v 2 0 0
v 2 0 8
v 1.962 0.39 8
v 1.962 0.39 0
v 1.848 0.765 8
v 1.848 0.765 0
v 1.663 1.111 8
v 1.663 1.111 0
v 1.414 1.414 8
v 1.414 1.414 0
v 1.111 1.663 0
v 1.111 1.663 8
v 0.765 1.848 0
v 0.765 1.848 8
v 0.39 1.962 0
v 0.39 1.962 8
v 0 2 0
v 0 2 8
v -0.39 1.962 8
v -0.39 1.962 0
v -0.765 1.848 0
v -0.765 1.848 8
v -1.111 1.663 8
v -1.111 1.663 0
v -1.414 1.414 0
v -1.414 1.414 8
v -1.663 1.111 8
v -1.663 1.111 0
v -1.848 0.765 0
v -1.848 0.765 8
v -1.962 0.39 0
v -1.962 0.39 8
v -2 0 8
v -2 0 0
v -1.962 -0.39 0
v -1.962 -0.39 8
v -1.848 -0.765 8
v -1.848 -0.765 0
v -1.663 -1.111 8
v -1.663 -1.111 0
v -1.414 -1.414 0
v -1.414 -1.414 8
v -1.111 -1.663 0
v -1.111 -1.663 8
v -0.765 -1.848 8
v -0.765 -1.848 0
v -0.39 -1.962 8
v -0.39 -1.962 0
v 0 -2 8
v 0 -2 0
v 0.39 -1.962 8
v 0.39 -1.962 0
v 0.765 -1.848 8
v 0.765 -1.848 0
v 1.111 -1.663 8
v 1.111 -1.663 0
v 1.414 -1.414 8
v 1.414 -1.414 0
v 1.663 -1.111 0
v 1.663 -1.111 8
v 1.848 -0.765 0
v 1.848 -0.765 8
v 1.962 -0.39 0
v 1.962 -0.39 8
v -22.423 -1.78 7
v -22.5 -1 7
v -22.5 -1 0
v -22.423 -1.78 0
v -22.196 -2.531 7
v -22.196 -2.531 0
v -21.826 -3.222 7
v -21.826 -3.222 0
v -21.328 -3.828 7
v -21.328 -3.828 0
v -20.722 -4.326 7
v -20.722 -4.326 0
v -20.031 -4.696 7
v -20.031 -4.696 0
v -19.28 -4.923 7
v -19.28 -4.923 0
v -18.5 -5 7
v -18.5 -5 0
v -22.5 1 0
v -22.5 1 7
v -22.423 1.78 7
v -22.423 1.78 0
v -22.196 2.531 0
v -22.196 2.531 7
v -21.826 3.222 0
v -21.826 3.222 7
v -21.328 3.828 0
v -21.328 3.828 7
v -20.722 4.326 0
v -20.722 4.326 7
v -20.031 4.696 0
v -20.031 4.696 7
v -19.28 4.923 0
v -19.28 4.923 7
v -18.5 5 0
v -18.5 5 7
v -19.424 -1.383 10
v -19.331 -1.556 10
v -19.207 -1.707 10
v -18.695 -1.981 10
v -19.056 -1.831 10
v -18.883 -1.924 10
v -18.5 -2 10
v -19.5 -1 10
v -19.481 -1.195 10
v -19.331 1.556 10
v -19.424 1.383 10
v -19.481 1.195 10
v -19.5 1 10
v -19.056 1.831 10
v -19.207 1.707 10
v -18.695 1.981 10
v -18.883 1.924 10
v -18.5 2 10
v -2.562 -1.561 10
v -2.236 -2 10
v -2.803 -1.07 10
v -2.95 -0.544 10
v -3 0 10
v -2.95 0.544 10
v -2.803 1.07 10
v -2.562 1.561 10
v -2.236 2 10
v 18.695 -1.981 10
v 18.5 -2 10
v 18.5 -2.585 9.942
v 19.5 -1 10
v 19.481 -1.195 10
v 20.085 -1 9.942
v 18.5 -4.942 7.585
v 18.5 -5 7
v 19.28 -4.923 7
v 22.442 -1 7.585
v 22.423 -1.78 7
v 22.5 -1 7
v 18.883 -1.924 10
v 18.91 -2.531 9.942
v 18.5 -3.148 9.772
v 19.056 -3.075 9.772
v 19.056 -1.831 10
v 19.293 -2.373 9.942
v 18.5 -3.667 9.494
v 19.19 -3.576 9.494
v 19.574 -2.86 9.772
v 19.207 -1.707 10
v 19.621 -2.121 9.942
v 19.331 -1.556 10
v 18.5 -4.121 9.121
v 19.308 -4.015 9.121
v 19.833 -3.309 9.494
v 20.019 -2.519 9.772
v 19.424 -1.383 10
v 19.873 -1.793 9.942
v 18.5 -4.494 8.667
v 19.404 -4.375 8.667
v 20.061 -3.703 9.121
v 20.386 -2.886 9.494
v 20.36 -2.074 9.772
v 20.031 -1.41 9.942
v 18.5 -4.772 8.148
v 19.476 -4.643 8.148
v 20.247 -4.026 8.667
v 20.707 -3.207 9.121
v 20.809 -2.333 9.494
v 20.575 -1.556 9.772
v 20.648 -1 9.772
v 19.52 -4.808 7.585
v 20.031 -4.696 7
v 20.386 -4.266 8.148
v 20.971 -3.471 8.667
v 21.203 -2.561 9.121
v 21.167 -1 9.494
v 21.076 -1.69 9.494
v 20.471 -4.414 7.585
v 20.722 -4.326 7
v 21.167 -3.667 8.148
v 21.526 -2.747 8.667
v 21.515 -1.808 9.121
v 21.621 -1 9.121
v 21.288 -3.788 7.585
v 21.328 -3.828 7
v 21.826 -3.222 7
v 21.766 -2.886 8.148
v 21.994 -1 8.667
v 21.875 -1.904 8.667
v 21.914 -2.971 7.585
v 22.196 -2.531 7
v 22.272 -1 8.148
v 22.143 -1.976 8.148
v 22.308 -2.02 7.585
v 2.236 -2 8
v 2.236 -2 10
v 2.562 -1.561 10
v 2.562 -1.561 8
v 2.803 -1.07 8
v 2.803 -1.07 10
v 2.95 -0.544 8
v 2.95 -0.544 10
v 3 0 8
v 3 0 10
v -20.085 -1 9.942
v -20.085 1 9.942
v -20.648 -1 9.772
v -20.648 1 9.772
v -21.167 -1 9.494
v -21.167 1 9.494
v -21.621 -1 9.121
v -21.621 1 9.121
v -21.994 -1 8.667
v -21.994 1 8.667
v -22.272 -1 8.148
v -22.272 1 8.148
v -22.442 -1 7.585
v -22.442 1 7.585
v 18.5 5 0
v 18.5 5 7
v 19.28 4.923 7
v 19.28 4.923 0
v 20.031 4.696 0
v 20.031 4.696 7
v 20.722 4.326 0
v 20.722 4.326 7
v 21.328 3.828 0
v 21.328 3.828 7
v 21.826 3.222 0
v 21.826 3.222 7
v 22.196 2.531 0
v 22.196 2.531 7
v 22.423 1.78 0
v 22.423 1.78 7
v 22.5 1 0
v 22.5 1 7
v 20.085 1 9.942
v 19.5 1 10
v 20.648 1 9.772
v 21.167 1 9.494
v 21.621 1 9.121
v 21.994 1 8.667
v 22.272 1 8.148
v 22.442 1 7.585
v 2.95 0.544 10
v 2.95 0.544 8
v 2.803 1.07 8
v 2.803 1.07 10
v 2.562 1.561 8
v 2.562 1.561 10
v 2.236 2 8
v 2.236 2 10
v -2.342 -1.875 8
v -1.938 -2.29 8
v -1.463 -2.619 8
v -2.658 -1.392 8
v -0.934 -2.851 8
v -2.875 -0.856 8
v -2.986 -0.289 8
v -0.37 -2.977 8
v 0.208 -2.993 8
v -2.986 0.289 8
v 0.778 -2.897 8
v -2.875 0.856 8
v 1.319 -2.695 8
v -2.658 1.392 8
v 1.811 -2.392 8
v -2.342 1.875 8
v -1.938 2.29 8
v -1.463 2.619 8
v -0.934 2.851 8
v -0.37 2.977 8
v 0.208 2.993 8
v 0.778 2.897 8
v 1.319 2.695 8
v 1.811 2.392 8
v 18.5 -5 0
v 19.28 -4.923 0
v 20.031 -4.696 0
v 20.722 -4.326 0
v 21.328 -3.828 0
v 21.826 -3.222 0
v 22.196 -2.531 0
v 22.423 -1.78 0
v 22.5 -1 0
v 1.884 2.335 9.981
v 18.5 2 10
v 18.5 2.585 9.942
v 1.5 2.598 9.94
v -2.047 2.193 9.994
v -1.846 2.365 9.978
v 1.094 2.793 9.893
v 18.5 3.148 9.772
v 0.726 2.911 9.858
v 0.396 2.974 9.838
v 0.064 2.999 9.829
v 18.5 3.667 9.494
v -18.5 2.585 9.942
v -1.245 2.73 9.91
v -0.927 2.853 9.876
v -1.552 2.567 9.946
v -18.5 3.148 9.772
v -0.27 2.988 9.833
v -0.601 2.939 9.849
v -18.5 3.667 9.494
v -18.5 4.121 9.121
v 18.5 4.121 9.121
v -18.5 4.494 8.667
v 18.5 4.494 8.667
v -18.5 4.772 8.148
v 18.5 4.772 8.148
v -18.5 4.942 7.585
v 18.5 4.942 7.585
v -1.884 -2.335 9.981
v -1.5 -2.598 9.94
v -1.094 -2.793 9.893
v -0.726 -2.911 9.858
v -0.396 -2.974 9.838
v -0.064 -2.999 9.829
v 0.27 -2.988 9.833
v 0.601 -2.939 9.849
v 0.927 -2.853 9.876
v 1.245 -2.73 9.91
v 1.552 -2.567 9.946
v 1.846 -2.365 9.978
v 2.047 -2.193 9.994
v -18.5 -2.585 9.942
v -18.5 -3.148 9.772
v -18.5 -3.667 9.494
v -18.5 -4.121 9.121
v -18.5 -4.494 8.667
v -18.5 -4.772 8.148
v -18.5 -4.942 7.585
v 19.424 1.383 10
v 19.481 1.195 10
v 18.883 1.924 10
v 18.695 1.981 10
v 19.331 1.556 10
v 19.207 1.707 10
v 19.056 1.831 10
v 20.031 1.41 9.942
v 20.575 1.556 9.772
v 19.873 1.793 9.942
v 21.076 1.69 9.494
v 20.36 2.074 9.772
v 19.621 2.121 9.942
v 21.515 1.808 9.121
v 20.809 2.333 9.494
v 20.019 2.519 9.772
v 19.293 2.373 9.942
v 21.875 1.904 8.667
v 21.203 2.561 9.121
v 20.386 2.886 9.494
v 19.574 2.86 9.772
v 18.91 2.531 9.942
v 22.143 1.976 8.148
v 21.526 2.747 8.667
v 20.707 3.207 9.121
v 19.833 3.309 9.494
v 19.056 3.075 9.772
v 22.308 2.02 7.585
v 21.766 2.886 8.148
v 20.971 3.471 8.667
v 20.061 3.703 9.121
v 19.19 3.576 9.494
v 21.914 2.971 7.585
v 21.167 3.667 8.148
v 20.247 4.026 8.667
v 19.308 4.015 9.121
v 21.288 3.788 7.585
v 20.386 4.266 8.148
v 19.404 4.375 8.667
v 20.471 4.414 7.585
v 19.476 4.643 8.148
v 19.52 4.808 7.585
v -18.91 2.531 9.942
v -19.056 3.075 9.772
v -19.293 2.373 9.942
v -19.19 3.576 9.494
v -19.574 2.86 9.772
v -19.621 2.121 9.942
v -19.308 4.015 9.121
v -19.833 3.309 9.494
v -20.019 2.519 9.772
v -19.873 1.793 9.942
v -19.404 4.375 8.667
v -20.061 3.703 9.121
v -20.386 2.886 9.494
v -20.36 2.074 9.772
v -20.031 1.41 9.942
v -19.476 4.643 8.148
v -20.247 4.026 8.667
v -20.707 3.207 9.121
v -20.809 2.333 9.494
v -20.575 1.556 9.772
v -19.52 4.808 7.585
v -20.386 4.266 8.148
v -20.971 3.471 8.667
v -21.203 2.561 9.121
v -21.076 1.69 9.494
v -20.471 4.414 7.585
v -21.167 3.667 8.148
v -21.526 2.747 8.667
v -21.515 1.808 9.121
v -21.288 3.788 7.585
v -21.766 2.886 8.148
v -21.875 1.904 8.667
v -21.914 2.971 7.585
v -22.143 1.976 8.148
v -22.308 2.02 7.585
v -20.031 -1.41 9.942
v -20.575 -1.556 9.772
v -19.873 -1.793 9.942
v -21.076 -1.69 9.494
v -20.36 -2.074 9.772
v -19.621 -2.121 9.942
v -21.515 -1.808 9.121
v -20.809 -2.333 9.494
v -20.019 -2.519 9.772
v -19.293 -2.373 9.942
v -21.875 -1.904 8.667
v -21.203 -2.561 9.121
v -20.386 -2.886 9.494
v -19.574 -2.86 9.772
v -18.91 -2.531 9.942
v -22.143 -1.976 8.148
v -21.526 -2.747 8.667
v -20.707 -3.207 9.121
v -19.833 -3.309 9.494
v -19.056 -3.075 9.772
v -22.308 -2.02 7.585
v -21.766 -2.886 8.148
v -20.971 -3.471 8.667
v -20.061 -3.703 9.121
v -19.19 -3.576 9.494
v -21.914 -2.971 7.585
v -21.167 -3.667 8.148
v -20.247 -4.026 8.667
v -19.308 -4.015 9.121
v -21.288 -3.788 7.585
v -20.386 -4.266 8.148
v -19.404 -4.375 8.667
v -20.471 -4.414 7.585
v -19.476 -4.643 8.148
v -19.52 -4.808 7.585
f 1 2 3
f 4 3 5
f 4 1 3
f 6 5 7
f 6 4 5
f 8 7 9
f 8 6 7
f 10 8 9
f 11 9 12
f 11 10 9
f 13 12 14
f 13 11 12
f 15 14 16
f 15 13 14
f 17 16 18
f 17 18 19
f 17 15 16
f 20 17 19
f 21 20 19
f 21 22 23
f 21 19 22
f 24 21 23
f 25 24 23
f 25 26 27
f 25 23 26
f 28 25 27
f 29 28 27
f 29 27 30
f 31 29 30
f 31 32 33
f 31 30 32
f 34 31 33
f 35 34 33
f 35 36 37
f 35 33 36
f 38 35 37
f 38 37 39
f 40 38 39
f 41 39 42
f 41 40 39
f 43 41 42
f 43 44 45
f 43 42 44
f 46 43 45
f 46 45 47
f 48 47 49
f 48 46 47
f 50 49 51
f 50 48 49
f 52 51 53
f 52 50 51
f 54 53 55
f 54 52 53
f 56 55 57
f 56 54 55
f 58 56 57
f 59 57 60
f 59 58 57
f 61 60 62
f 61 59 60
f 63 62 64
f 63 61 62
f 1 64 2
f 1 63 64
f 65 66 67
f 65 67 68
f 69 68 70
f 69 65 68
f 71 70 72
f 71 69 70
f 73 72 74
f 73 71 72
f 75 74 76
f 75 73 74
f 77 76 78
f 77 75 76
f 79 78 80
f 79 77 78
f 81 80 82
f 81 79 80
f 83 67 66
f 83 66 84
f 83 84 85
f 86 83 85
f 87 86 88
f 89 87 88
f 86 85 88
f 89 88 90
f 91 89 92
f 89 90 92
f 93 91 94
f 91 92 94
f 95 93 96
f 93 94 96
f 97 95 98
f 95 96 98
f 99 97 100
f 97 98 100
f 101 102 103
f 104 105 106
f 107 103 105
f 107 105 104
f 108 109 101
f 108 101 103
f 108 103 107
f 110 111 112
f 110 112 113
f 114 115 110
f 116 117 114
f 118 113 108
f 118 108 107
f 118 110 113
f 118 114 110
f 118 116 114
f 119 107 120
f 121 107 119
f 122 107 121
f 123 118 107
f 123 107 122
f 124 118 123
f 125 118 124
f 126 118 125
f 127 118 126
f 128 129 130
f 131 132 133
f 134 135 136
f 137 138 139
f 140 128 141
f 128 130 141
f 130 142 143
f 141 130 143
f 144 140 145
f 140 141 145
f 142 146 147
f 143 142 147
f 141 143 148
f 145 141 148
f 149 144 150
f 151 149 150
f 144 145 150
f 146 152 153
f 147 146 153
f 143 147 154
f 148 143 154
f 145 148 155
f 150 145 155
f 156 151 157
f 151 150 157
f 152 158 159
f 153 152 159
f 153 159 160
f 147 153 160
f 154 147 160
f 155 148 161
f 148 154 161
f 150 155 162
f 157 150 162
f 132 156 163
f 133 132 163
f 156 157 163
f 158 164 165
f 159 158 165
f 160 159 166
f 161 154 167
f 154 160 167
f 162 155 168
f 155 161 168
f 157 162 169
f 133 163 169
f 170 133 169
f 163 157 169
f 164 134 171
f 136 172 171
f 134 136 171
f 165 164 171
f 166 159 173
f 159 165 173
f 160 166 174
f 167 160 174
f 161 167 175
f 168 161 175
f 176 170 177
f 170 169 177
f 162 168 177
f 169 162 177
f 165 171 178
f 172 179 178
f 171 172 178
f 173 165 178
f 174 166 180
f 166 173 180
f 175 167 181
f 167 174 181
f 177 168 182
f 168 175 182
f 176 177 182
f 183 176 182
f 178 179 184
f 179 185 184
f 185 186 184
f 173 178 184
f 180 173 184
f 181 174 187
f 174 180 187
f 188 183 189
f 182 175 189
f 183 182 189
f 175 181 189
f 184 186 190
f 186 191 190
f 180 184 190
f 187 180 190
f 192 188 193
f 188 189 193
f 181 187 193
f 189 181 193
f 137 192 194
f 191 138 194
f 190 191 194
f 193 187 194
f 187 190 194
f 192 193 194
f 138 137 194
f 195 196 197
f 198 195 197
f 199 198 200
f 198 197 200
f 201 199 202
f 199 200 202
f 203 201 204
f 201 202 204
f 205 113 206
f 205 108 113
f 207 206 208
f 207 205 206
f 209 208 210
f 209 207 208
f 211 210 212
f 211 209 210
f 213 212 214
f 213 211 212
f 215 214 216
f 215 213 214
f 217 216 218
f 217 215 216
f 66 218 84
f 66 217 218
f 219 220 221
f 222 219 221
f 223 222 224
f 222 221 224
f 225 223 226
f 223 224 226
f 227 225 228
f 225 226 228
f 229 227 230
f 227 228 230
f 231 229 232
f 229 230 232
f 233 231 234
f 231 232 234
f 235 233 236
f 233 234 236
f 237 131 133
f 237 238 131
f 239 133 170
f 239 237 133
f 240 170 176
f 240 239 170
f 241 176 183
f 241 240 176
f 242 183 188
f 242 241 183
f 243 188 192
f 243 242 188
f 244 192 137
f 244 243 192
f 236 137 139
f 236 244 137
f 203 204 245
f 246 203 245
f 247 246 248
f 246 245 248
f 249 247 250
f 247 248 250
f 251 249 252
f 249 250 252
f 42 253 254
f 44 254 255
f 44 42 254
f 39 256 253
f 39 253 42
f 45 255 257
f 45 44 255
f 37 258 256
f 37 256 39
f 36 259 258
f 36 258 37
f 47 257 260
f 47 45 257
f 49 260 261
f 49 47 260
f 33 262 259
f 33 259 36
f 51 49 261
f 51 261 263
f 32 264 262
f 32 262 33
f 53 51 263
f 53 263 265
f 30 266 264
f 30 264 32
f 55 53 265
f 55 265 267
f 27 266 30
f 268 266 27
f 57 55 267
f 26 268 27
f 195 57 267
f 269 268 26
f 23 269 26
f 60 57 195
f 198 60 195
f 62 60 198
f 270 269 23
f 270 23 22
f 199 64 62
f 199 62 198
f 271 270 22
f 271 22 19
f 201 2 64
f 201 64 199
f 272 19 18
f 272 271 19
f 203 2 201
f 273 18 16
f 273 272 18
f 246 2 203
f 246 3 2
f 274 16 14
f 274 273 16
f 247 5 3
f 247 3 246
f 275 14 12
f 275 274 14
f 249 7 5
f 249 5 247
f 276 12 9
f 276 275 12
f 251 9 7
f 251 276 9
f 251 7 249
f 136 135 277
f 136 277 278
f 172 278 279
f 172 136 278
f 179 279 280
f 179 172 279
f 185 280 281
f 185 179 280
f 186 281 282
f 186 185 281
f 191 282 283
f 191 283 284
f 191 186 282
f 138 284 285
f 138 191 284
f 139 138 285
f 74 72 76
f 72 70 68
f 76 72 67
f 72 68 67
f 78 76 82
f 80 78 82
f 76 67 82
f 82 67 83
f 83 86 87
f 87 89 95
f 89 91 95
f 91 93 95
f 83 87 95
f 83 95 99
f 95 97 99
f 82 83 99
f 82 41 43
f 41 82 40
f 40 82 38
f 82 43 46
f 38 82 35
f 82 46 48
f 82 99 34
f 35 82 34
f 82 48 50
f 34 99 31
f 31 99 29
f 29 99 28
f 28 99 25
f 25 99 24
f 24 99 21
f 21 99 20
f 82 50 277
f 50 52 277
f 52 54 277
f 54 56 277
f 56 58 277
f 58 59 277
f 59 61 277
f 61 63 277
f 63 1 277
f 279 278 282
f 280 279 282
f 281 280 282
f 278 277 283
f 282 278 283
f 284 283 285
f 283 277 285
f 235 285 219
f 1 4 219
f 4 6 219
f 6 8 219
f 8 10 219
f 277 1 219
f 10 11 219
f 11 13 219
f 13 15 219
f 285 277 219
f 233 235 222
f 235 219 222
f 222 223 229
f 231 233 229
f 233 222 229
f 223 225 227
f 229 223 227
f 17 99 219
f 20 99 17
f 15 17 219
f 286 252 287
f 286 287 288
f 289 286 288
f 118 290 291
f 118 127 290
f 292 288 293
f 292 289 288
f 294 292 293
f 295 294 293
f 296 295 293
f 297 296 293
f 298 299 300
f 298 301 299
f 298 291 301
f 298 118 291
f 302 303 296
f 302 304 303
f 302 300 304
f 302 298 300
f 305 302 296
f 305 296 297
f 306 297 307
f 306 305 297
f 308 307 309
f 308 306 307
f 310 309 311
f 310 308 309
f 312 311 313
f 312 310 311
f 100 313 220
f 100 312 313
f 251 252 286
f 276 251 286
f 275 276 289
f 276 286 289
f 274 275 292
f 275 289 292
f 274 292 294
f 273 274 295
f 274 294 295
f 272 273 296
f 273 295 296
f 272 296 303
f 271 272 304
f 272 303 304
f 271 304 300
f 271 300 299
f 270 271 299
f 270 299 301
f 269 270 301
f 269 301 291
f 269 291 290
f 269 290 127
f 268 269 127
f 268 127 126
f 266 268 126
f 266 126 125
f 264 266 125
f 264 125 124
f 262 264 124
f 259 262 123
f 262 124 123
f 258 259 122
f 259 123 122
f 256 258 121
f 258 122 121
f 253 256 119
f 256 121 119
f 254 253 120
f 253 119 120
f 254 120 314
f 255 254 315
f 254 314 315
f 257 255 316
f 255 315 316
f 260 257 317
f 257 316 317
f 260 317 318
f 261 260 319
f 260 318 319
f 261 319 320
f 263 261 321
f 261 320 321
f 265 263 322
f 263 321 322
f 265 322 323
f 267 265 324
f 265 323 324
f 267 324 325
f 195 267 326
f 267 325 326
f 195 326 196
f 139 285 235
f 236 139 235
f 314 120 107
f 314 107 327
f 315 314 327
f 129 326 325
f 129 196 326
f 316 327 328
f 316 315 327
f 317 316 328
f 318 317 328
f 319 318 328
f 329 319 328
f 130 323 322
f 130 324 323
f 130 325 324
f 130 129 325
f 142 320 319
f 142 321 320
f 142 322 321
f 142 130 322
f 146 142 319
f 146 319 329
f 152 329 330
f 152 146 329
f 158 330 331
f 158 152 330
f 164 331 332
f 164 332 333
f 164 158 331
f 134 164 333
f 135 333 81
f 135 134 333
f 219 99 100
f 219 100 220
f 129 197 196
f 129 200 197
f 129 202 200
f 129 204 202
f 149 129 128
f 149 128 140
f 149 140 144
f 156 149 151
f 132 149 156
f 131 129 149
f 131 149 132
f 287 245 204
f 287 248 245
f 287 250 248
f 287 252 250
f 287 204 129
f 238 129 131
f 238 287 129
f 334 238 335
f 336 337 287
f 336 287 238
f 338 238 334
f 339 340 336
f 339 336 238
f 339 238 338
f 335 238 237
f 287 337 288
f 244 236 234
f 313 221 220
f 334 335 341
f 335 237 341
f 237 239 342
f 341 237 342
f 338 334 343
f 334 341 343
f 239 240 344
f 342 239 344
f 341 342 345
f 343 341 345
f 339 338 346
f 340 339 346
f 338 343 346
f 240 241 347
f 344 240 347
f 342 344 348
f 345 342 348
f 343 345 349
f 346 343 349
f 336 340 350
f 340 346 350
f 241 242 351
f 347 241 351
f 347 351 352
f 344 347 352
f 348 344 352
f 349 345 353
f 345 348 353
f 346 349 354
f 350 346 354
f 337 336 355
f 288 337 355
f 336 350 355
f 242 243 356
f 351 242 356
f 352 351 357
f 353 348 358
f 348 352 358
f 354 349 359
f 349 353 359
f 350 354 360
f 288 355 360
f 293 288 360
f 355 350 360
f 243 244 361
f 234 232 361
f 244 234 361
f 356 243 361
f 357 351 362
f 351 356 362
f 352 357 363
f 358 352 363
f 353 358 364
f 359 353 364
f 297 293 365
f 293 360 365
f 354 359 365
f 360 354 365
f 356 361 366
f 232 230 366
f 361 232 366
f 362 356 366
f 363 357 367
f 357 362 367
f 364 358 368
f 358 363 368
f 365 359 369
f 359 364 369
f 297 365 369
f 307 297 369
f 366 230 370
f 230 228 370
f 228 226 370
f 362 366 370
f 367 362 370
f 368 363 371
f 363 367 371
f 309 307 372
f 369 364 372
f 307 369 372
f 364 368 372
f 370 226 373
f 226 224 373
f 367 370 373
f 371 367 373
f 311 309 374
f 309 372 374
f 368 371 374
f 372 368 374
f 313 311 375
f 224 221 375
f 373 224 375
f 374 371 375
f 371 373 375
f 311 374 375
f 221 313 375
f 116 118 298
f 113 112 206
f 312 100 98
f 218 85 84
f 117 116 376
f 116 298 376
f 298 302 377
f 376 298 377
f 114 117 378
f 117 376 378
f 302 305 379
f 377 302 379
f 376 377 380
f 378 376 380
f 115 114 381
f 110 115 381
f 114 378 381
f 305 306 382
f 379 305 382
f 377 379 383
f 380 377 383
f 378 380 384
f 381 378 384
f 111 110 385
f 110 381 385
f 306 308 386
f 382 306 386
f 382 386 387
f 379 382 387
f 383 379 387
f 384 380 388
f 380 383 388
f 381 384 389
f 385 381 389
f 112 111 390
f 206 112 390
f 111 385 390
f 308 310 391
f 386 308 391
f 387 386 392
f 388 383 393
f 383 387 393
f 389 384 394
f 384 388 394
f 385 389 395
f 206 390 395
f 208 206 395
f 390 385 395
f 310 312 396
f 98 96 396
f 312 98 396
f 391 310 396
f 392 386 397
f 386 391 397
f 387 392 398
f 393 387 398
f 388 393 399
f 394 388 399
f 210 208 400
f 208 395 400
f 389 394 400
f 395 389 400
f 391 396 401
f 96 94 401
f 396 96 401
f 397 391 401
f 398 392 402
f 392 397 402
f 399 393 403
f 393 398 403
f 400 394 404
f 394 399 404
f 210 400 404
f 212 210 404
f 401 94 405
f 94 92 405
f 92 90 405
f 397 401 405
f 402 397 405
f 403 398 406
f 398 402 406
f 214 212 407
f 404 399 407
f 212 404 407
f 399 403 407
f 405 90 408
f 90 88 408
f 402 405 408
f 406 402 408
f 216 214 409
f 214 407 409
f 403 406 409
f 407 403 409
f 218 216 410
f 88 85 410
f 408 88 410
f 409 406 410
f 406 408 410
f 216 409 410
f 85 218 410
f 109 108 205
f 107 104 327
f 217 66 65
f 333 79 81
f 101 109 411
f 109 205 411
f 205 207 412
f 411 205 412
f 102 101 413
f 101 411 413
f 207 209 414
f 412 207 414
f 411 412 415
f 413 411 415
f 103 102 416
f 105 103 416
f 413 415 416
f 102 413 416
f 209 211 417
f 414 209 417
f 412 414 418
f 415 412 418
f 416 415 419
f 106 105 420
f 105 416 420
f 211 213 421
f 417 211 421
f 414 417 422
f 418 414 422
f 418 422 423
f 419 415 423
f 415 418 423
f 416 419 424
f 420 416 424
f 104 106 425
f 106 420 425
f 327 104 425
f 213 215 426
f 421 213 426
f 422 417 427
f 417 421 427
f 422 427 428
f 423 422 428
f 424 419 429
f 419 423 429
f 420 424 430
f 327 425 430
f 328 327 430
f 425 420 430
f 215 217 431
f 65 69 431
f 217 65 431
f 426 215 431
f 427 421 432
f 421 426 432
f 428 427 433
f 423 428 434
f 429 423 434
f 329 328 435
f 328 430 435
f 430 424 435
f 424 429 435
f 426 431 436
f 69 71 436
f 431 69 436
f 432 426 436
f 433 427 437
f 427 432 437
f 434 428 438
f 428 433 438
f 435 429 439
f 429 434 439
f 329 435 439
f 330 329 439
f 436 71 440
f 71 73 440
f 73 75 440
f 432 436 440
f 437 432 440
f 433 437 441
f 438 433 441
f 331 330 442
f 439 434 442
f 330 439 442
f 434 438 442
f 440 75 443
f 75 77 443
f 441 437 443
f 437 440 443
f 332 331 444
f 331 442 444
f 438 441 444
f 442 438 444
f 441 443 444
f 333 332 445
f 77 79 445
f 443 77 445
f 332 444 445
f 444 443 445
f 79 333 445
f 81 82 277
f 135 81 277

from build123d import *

# Parameters (mm, degrees)
F0_W     = 45
F0_H     = 10
F0_R     = 3
F0_R_2   = 2
F1_DEPTH = 10
F2_R     = 4
F3_R     = 3
F5_DEPTH = 2


with BuildPart() as f1:
    # F0 (on Top) → F1 (new body)
    with BuildSketch(Plane.XY):
        Rectangle(F0_W, F0_H)
        Circle(F0_R, mode=Mode.SUBTRACT)
        Circle(F0_R)
        Circle(F0_R_2, mode=Mode.SUBTRACT)
    extrude(amount=F1_DEPTH)

    # F2
    f2_edges = [f1.edges().sort_by_distance(p)[0] for p in [
        (-22.5, -5, 5),
        (22.5, -5, 5),
        (22.5, 5, 5),
        (-22.5, 5, 5),
    ]]
    fillet(f2_edges, radius=F2_R)

    # F3
    f3_edges = [f1.edges().sort_by_distance(p)[0] for p in [
        (0, -5, 10),
        (0, 5, 10),
        (21.328427, 3.828427, 10),
        (-21.328427, 3.828427, 10),
        (22.5, 0, 10),
        (-22.5, 0, 10),
        (21.328427, -3.828427, 10),
        (-21.328427, -3.828427, 10),
    ]]
    fillet(f3_edges, radius=F3_R)

    # F4 (on face) → F5 (cut)
    with BuildSketch(Plane.XY.offset(10)):
        with BuildLine():
            ThreePointArc((0, 2), (1.4142135624, 1.4142135624), (2, 0))
            ThreePointArc((2, 0), (1.4142135624, -1.4142135624), (0, -2))
            Line((0, -2), (2.2360679775, -2))
            ThreePointArc((2.2360679775, -2), (2.8025170769, -1.0704662693), (3, 0))
            ThreePointArc((3, 0), (2.8025170769, 1.0704662693), (2.2360679775, 2))
            Line((2.2360679775, 2), (0, 2))
        make_face()
        with BuildLine():
            Line((-2.2360679775, 2), (0, 2))
            Line((0, 2), (2.2360679775, 2))
            ThreePointArc((2.2360679775, 2), (0, 3), (-2.2360679775, 2))
        make_face()
        with BuildLine():
            ThreePointArc((0, -2), (-2, 0), (0, 2))
            Line((0, 2), (-2.2360679775, 2))
            ThreePointArc((-2.2360679775, 2), (-3, 0), (-2.2360679775, -2))
            Line((-2.2360679775, -2), (0, -2))
        make_face()
        with BuildLine():
            Line((2.2360679775, -2), (0, -2))
            Line((0, -2), (-2.2360679775, -2))
            ThreePointArc((-2.2360679775, -2), (0, -3), (2.2360679775, -2))
        make_face()
    extrude(amount=-F5_DEPTH, mode=Mode.SUBTRACT)


solid = f1.part
